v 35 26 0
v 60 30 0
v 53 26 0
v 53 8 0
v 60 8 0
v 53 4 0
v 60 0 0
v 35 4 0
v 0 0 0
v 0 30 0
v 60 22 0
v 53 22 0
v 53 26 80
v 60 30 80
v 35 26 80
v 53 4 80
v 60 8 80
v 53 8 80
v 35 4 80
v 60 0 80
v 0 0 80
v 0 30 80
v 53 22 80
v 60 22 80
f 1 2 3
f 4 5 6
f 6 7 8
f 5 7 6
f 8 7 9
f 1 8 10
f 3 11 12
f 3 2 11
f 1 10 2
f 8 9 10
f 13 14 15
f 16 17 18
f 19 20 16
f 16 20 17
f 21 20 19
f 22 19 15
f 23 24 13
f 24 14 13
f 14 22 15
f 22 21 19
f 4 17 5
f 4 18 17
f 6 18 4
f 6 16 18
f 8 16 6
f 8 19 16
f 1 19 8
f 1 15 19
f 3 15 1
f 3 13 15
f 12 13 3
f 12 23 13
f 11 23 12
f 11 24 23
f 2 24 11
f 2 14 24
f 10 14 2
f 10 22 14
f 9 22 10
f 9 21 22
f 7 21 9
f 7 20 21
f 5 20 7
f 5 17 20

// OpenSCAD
$fn = 32;

// ----------------------------------------------------------------------
// T-slot rail: 60 x 30 mm section, 80 mm long
// ----------------------------------------------------------------------

// --- parameters (mm) ---
profile_height = 80;      // extrusion height
profile_points = 12;      // points of the closed outline

profile = [[0, 0], [60, 0], [60, 8], [53, 8], [53, 4], [35, 4], [35, 26], [53, 26], [53, 22], [60, 22], [60, 30], [0, 30]];  // single closed polygon, 12 points, counter clockwise

// --- the one profile operation ---
linear_extrude(height = profile_height) polygon(points = profile);
